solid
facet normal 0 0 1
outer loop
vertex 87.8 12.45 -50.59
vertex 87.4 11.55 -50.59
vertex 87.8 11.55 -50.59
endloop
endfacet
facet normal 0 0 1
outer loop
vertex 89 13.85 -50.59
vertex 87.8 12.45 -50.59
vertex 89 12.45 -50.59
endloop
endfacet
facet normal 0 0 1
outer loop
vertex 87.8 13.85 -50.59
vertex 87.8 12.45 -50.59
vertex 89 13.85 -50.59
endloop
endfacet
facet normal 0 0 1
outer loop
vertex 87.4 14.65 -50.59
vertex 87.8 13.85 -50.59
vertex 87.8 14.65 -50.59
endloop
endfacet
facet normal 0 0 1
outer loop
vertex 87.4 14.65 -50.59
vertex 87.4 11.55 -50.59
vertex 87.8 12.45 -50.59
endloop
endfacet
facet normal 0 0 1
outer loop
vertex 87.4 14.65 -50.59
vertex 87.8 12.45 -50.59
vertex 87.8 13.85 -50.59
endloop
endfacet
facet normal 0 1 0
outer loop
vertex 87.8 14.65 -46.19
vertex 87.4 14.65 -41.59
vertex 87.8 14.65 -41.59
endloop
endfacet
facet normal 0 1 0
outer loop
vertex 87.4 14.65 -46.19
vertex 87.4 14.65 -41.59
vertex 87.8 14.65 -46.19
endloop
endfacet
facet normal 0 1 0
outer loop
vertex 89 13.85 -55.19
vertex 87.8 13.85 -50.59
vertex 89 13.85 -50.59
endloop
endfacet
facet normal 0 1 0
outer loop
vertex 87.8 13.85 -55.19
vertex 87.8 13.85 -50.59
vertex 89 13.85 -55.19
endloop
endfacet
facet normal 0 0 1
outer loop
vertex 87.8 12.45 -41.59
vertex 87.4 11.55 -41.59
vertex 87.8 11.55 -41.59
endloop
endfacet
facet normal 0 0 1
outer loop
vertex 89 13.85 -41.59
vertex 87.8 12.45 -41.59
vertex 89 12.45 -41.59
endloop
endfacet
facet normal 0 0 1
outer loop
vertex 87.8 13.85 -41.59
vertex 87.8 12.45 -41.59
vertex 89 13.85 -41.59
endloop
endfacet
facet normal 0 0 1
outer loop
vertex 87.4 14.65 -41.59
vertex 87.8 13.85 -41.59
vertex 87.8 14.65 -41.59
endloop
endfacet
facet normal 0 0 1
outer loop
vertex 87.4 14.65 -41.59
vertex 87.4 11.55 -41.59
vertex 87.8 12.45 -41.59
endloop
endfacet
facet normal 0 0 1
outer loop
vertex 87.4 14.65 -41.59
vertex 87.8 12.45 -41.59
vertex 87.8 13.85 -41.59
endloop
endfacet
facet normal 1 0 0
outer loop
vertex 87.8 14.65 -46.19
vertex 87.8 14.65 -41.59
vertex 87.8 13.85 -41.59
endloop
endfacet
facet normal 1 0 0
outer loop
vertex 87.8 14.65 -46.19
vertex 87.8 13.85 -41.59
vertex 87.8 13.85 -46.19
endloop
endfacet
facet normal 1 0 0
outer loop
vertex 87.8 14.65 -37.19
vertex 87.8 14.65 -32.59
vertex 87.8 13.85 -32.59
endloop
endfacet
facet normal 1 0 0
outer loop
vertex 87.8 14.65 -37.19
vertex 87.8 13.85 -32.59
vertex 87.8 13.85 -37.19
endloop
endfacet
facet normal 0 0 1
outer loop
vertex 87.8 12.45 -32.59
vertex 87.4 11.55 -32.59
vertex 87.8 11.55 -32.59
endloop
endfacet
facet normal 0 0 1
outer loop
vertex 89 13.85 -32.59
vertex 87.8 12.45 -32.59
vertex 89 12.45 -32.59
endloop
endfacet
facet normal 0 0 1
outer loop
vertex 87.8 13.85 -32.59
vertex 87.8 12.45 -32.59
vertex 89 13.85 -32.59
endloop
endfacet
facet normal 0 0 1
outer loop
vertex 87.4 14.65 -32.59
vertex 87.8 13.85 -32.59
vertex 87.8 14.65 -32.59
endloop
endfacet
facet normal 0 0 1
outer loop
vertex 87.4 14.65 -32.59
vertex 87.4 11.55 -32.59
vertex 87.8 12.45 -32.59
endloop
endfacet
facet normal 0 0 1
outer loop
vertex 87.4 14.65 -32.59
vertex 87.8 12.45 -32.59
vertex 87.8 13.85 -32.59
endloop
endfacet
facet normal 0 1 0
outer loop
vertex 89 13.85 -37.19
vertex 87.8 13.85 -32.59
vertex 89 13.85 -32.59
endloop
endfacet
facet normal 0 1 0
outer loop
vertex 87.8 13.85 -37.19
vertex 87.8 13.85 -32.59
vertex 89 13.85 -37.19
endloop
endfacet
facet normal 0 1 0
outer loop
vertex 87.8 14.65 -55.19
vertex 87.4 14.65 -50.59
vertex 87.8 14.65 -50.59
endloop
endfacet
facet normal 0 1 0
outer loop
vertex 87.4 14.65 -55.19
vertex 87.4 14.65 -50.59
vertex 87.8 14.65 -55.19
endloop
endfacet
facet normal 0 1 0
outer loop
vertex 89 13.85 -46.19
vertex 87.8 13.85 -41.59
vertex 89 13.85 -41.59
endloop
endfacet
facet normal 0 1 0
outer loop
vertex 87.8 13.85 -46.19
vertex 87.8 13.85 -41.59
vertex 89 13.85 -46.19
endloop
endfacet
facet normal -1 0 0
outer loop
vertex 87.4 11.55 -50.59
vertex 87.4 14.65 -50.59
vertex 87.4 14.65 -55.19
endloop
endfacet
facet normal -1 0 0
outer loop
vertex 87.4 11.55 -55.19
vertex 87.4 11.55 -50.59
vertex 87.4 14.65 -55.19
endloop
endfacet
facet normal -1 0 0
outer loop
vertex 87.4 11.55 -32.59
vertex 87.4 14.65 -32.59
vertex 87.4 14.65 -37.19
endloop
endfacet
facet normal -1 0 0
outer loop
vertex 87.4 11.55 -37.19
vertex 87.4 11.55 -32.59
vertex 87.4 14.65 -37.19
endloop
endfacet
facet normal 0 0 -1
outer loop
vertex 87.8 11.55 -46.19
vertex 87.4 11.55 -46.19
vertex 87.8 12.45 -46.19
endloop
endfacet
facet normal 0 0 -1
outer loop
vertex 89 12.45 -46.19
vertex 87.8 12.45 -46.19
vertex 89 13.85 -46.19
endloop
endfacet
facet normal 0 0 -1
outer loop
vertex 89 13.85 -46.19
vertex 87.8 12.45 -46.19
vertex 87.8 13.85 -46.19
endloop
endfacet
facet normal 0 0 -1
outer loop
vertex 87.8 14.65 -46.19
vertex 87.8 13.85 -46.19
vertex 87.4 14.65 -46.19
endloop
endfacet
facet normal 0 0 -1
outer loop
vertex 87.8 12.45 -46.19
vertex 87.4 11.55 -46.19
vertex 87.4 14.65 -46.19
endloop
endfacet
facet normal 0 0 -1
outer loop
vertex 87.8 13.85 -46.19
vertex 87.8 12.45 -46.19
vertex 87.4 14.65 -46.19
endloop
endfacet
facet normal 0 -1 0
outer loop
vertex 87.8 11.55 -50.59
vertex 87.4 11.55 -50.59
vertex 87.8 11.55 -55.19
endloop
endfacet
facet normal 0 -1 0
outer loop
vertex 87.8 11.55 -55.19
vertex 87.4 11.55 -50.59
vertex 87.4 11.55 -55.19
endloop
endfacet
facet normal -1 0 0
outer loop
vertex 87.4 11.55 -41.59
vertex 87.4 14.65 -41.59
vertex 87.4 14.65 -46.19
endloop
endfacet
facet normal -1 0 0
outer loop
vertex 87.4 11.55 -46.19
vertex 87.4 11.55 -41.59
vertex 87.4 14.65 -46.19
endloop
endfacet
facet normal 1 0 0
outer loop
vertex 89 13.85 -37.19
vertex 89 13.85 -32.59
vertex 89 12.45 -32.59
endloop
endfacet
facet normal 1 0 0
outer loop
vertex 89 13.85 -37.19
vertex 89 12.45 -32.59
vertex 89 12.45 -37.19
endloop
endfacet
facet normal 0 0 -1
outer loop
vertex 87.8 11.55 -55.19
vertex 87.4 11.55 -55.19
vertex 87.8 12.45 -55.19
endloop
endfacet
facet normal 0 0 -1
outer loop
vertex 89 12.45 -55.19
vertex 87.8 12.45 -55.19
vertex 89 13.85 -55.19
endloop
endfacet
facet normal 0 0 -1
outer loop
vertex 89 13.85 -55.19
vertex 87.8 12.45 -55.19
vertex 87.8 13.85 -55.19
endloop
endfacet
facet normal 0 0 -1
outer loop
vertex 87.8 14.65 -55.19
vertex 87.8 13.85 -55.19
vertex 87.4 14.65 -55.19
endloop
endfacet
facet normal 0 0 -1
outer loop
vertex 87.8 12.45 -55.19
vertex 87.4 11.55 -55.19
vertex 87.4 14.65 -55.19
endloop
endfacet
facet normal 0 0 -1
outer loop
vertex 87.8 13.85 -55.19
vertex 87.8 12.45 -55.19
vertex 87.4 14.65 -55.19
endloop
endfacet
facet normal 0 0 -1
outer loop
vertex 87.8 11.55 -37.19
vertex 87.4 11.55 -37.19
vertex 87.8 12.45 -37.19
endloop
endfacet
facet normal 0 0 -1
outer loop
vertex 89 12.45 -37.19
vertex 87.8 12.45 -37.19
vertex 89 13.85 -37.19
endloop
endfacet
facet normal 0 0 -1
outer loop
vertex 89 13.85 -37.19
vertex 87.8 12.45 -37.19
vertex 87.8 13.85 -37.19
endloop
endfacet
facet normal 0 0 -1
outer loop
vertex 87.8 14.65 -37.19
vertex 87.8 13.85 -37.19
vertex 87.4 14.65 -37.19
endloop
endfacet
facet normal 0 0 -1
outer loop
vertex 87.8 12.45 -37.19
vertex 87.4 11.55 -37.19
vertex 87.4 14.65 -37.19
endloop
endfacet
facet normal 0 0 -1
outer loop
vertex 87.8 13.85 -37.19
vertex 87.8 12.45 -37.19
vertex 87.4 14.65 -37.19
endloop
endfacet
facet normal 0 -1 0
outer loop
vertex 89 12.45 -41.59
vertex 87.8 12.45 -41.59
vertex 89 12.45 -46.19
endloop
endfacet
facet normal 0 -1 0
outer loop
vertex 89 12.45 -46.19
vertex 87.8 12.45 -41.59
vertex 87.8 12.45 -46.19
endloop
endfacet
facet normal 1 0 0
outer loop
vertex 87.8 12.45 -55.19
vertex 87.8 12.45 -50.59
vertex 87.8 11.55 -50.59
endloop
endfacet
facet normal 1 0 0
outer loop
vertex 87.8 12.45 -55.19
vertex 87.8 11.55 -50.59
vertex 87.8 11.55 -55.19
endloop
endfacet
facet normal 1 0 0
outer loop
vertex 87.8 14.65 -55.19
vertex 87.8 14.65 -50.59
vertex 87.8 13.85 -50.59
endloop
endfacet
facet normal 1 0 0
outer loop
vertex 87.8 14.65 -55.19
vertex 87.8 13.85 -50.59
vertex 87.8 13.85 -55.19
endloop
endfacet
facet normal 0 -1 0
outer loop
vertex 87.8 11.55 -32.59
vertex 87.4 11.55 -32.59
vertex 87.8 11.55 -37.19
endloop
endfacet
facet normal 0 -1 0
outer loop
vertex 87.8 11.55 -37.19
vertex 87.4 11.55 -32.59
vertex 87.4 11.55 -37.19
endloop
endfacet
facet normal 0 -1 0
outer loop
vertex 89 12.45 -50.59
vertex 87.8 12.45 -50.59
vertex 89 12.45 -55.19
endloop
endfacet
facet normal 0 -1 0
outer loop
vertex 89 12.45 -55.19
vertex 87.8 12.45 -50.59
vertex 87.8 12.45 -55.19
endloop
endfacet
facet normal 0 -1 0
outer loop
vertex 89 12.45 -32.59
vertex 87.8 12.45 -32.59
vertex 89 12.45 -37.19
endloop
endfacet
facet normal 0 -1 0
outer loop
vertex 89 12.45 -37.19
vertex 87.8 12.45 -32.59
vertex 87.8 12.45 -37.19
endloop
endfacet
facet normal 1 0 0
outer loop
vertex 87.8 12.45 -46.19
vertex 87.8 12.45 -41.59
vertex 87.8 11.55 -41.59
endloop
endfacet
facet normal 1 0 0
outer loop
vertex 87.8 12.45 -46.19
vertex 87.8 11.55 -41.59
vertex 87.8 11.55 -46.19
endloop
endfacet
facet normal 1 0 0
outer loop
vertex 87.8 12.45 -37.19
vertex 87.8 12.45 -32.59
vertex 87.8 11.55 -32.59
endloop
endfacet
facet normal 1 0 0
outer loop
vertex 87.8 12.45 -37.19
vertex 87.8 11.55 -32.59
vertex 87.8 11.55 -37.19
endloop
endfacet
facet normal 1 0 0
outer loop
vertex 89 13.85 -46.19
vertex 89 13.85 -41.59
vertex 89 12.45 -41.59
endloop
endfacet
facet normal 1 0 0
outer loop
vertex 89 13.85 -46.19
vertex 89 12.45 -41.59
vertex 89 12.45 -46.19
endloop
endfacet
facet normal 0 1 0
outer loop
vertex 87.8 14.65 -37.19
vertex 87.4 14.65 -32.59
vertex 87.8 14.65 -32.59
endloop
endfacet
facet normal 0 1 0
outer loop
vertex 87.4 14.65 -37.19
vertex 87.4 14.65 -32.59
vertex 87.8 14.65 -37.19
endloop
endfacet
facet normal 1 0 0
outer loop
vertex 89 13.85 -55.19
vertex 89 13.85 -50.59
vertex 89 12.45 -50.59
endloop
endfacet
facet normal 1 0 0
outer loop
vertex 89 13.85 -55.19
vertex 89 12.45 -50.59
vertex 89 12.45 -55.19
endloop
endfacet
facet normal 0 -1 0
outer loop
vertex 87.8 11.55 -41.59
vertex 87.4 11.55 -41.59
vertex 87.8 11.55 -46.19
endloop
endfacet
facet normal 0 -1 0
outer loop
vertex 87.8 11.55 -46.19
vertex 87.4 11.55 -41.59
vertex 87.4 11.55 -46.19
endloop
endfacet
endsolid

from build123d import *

# Parameters (mm, degrees)
AUFSATZ_LINEAR_START                = -0.4
AUFSATZ_LINEAR_AUSTRAGEN1_OUTLINE_W = 4.6
AUFSATZ_LINEAR_AUSTRAGEN1_OUTLINE_H = 3.1
AUFSATZ_LINEAR_AUSTRAGEN1_DEPTH     = 0.4
SKIZZE3_W                           = 4.6
SKIZZE3_H                           = 1.4
AUFSATZ_LINEAR_AUSTRAGEN2_DEPTH     = 1.2
LINEARES_MUSTER1_COUNT              = 3
LINEARES_MUSTER1_PITCH              = 9


# Read off the part's stored shape, not the designer's step: Aufsatz-Linear austragen1
with BuildPart() as part:
    # Aufsatz-Linear austragen1 outline → Aufsatz-Linear austragen1 (new body)
    with BuildSketch(Plane(origin=(87.8, 0, 0), x_dir=(0, 0, -1), z_dir=(1, 0, 0)).offset(AUFSATZ_LINEAR_START)):
        with Locations((34.89, 13.1)):
            Rectangle(AUFSATZ_LINEAR_AUSTRAGEN1_OUTLINE_W, AUFSATZ_LINEAR_AUSTRAGEN1_OUTLINE_H)
    extrude(amount=AUFSATZ_LINEAR_AUSTRAGEN1_DEPTH)

    # Skizze3 → Aufsatz-Linear austragen2 (add)
    with BuildSketch(Plane(origin=(87.8, 0, 0), x_dir=(0, 0, -1), z_dir=(1, 0, 0))):
        with Locations((34.89, 13.15)):
            Rectangle(SKIZZE3_W, SKIZZE3_H)
    extrude(amount=AUFSATZ_LINEAR_AUSTRAGEN2_DEPTH)


with BuildPart() as lineares_muster1_1:
    # Lineares Muster1: pattern copy
    add(part.part.moved(Location(Vector(0, 0, -1) * (1 * LINEARES_MUSTER1_PITCH))))


with BuildPart() as lineares_muster1_2:
    # Lineares Muster1: pattern copy
    add(part.part.moved(Location(Vector(0, 0, -1) * (2 * LINEARES_MUSTER1_PITCH))))


solid = Compound([part.part, lineares_muster1_1.part, lineares_muster1_2.part])
